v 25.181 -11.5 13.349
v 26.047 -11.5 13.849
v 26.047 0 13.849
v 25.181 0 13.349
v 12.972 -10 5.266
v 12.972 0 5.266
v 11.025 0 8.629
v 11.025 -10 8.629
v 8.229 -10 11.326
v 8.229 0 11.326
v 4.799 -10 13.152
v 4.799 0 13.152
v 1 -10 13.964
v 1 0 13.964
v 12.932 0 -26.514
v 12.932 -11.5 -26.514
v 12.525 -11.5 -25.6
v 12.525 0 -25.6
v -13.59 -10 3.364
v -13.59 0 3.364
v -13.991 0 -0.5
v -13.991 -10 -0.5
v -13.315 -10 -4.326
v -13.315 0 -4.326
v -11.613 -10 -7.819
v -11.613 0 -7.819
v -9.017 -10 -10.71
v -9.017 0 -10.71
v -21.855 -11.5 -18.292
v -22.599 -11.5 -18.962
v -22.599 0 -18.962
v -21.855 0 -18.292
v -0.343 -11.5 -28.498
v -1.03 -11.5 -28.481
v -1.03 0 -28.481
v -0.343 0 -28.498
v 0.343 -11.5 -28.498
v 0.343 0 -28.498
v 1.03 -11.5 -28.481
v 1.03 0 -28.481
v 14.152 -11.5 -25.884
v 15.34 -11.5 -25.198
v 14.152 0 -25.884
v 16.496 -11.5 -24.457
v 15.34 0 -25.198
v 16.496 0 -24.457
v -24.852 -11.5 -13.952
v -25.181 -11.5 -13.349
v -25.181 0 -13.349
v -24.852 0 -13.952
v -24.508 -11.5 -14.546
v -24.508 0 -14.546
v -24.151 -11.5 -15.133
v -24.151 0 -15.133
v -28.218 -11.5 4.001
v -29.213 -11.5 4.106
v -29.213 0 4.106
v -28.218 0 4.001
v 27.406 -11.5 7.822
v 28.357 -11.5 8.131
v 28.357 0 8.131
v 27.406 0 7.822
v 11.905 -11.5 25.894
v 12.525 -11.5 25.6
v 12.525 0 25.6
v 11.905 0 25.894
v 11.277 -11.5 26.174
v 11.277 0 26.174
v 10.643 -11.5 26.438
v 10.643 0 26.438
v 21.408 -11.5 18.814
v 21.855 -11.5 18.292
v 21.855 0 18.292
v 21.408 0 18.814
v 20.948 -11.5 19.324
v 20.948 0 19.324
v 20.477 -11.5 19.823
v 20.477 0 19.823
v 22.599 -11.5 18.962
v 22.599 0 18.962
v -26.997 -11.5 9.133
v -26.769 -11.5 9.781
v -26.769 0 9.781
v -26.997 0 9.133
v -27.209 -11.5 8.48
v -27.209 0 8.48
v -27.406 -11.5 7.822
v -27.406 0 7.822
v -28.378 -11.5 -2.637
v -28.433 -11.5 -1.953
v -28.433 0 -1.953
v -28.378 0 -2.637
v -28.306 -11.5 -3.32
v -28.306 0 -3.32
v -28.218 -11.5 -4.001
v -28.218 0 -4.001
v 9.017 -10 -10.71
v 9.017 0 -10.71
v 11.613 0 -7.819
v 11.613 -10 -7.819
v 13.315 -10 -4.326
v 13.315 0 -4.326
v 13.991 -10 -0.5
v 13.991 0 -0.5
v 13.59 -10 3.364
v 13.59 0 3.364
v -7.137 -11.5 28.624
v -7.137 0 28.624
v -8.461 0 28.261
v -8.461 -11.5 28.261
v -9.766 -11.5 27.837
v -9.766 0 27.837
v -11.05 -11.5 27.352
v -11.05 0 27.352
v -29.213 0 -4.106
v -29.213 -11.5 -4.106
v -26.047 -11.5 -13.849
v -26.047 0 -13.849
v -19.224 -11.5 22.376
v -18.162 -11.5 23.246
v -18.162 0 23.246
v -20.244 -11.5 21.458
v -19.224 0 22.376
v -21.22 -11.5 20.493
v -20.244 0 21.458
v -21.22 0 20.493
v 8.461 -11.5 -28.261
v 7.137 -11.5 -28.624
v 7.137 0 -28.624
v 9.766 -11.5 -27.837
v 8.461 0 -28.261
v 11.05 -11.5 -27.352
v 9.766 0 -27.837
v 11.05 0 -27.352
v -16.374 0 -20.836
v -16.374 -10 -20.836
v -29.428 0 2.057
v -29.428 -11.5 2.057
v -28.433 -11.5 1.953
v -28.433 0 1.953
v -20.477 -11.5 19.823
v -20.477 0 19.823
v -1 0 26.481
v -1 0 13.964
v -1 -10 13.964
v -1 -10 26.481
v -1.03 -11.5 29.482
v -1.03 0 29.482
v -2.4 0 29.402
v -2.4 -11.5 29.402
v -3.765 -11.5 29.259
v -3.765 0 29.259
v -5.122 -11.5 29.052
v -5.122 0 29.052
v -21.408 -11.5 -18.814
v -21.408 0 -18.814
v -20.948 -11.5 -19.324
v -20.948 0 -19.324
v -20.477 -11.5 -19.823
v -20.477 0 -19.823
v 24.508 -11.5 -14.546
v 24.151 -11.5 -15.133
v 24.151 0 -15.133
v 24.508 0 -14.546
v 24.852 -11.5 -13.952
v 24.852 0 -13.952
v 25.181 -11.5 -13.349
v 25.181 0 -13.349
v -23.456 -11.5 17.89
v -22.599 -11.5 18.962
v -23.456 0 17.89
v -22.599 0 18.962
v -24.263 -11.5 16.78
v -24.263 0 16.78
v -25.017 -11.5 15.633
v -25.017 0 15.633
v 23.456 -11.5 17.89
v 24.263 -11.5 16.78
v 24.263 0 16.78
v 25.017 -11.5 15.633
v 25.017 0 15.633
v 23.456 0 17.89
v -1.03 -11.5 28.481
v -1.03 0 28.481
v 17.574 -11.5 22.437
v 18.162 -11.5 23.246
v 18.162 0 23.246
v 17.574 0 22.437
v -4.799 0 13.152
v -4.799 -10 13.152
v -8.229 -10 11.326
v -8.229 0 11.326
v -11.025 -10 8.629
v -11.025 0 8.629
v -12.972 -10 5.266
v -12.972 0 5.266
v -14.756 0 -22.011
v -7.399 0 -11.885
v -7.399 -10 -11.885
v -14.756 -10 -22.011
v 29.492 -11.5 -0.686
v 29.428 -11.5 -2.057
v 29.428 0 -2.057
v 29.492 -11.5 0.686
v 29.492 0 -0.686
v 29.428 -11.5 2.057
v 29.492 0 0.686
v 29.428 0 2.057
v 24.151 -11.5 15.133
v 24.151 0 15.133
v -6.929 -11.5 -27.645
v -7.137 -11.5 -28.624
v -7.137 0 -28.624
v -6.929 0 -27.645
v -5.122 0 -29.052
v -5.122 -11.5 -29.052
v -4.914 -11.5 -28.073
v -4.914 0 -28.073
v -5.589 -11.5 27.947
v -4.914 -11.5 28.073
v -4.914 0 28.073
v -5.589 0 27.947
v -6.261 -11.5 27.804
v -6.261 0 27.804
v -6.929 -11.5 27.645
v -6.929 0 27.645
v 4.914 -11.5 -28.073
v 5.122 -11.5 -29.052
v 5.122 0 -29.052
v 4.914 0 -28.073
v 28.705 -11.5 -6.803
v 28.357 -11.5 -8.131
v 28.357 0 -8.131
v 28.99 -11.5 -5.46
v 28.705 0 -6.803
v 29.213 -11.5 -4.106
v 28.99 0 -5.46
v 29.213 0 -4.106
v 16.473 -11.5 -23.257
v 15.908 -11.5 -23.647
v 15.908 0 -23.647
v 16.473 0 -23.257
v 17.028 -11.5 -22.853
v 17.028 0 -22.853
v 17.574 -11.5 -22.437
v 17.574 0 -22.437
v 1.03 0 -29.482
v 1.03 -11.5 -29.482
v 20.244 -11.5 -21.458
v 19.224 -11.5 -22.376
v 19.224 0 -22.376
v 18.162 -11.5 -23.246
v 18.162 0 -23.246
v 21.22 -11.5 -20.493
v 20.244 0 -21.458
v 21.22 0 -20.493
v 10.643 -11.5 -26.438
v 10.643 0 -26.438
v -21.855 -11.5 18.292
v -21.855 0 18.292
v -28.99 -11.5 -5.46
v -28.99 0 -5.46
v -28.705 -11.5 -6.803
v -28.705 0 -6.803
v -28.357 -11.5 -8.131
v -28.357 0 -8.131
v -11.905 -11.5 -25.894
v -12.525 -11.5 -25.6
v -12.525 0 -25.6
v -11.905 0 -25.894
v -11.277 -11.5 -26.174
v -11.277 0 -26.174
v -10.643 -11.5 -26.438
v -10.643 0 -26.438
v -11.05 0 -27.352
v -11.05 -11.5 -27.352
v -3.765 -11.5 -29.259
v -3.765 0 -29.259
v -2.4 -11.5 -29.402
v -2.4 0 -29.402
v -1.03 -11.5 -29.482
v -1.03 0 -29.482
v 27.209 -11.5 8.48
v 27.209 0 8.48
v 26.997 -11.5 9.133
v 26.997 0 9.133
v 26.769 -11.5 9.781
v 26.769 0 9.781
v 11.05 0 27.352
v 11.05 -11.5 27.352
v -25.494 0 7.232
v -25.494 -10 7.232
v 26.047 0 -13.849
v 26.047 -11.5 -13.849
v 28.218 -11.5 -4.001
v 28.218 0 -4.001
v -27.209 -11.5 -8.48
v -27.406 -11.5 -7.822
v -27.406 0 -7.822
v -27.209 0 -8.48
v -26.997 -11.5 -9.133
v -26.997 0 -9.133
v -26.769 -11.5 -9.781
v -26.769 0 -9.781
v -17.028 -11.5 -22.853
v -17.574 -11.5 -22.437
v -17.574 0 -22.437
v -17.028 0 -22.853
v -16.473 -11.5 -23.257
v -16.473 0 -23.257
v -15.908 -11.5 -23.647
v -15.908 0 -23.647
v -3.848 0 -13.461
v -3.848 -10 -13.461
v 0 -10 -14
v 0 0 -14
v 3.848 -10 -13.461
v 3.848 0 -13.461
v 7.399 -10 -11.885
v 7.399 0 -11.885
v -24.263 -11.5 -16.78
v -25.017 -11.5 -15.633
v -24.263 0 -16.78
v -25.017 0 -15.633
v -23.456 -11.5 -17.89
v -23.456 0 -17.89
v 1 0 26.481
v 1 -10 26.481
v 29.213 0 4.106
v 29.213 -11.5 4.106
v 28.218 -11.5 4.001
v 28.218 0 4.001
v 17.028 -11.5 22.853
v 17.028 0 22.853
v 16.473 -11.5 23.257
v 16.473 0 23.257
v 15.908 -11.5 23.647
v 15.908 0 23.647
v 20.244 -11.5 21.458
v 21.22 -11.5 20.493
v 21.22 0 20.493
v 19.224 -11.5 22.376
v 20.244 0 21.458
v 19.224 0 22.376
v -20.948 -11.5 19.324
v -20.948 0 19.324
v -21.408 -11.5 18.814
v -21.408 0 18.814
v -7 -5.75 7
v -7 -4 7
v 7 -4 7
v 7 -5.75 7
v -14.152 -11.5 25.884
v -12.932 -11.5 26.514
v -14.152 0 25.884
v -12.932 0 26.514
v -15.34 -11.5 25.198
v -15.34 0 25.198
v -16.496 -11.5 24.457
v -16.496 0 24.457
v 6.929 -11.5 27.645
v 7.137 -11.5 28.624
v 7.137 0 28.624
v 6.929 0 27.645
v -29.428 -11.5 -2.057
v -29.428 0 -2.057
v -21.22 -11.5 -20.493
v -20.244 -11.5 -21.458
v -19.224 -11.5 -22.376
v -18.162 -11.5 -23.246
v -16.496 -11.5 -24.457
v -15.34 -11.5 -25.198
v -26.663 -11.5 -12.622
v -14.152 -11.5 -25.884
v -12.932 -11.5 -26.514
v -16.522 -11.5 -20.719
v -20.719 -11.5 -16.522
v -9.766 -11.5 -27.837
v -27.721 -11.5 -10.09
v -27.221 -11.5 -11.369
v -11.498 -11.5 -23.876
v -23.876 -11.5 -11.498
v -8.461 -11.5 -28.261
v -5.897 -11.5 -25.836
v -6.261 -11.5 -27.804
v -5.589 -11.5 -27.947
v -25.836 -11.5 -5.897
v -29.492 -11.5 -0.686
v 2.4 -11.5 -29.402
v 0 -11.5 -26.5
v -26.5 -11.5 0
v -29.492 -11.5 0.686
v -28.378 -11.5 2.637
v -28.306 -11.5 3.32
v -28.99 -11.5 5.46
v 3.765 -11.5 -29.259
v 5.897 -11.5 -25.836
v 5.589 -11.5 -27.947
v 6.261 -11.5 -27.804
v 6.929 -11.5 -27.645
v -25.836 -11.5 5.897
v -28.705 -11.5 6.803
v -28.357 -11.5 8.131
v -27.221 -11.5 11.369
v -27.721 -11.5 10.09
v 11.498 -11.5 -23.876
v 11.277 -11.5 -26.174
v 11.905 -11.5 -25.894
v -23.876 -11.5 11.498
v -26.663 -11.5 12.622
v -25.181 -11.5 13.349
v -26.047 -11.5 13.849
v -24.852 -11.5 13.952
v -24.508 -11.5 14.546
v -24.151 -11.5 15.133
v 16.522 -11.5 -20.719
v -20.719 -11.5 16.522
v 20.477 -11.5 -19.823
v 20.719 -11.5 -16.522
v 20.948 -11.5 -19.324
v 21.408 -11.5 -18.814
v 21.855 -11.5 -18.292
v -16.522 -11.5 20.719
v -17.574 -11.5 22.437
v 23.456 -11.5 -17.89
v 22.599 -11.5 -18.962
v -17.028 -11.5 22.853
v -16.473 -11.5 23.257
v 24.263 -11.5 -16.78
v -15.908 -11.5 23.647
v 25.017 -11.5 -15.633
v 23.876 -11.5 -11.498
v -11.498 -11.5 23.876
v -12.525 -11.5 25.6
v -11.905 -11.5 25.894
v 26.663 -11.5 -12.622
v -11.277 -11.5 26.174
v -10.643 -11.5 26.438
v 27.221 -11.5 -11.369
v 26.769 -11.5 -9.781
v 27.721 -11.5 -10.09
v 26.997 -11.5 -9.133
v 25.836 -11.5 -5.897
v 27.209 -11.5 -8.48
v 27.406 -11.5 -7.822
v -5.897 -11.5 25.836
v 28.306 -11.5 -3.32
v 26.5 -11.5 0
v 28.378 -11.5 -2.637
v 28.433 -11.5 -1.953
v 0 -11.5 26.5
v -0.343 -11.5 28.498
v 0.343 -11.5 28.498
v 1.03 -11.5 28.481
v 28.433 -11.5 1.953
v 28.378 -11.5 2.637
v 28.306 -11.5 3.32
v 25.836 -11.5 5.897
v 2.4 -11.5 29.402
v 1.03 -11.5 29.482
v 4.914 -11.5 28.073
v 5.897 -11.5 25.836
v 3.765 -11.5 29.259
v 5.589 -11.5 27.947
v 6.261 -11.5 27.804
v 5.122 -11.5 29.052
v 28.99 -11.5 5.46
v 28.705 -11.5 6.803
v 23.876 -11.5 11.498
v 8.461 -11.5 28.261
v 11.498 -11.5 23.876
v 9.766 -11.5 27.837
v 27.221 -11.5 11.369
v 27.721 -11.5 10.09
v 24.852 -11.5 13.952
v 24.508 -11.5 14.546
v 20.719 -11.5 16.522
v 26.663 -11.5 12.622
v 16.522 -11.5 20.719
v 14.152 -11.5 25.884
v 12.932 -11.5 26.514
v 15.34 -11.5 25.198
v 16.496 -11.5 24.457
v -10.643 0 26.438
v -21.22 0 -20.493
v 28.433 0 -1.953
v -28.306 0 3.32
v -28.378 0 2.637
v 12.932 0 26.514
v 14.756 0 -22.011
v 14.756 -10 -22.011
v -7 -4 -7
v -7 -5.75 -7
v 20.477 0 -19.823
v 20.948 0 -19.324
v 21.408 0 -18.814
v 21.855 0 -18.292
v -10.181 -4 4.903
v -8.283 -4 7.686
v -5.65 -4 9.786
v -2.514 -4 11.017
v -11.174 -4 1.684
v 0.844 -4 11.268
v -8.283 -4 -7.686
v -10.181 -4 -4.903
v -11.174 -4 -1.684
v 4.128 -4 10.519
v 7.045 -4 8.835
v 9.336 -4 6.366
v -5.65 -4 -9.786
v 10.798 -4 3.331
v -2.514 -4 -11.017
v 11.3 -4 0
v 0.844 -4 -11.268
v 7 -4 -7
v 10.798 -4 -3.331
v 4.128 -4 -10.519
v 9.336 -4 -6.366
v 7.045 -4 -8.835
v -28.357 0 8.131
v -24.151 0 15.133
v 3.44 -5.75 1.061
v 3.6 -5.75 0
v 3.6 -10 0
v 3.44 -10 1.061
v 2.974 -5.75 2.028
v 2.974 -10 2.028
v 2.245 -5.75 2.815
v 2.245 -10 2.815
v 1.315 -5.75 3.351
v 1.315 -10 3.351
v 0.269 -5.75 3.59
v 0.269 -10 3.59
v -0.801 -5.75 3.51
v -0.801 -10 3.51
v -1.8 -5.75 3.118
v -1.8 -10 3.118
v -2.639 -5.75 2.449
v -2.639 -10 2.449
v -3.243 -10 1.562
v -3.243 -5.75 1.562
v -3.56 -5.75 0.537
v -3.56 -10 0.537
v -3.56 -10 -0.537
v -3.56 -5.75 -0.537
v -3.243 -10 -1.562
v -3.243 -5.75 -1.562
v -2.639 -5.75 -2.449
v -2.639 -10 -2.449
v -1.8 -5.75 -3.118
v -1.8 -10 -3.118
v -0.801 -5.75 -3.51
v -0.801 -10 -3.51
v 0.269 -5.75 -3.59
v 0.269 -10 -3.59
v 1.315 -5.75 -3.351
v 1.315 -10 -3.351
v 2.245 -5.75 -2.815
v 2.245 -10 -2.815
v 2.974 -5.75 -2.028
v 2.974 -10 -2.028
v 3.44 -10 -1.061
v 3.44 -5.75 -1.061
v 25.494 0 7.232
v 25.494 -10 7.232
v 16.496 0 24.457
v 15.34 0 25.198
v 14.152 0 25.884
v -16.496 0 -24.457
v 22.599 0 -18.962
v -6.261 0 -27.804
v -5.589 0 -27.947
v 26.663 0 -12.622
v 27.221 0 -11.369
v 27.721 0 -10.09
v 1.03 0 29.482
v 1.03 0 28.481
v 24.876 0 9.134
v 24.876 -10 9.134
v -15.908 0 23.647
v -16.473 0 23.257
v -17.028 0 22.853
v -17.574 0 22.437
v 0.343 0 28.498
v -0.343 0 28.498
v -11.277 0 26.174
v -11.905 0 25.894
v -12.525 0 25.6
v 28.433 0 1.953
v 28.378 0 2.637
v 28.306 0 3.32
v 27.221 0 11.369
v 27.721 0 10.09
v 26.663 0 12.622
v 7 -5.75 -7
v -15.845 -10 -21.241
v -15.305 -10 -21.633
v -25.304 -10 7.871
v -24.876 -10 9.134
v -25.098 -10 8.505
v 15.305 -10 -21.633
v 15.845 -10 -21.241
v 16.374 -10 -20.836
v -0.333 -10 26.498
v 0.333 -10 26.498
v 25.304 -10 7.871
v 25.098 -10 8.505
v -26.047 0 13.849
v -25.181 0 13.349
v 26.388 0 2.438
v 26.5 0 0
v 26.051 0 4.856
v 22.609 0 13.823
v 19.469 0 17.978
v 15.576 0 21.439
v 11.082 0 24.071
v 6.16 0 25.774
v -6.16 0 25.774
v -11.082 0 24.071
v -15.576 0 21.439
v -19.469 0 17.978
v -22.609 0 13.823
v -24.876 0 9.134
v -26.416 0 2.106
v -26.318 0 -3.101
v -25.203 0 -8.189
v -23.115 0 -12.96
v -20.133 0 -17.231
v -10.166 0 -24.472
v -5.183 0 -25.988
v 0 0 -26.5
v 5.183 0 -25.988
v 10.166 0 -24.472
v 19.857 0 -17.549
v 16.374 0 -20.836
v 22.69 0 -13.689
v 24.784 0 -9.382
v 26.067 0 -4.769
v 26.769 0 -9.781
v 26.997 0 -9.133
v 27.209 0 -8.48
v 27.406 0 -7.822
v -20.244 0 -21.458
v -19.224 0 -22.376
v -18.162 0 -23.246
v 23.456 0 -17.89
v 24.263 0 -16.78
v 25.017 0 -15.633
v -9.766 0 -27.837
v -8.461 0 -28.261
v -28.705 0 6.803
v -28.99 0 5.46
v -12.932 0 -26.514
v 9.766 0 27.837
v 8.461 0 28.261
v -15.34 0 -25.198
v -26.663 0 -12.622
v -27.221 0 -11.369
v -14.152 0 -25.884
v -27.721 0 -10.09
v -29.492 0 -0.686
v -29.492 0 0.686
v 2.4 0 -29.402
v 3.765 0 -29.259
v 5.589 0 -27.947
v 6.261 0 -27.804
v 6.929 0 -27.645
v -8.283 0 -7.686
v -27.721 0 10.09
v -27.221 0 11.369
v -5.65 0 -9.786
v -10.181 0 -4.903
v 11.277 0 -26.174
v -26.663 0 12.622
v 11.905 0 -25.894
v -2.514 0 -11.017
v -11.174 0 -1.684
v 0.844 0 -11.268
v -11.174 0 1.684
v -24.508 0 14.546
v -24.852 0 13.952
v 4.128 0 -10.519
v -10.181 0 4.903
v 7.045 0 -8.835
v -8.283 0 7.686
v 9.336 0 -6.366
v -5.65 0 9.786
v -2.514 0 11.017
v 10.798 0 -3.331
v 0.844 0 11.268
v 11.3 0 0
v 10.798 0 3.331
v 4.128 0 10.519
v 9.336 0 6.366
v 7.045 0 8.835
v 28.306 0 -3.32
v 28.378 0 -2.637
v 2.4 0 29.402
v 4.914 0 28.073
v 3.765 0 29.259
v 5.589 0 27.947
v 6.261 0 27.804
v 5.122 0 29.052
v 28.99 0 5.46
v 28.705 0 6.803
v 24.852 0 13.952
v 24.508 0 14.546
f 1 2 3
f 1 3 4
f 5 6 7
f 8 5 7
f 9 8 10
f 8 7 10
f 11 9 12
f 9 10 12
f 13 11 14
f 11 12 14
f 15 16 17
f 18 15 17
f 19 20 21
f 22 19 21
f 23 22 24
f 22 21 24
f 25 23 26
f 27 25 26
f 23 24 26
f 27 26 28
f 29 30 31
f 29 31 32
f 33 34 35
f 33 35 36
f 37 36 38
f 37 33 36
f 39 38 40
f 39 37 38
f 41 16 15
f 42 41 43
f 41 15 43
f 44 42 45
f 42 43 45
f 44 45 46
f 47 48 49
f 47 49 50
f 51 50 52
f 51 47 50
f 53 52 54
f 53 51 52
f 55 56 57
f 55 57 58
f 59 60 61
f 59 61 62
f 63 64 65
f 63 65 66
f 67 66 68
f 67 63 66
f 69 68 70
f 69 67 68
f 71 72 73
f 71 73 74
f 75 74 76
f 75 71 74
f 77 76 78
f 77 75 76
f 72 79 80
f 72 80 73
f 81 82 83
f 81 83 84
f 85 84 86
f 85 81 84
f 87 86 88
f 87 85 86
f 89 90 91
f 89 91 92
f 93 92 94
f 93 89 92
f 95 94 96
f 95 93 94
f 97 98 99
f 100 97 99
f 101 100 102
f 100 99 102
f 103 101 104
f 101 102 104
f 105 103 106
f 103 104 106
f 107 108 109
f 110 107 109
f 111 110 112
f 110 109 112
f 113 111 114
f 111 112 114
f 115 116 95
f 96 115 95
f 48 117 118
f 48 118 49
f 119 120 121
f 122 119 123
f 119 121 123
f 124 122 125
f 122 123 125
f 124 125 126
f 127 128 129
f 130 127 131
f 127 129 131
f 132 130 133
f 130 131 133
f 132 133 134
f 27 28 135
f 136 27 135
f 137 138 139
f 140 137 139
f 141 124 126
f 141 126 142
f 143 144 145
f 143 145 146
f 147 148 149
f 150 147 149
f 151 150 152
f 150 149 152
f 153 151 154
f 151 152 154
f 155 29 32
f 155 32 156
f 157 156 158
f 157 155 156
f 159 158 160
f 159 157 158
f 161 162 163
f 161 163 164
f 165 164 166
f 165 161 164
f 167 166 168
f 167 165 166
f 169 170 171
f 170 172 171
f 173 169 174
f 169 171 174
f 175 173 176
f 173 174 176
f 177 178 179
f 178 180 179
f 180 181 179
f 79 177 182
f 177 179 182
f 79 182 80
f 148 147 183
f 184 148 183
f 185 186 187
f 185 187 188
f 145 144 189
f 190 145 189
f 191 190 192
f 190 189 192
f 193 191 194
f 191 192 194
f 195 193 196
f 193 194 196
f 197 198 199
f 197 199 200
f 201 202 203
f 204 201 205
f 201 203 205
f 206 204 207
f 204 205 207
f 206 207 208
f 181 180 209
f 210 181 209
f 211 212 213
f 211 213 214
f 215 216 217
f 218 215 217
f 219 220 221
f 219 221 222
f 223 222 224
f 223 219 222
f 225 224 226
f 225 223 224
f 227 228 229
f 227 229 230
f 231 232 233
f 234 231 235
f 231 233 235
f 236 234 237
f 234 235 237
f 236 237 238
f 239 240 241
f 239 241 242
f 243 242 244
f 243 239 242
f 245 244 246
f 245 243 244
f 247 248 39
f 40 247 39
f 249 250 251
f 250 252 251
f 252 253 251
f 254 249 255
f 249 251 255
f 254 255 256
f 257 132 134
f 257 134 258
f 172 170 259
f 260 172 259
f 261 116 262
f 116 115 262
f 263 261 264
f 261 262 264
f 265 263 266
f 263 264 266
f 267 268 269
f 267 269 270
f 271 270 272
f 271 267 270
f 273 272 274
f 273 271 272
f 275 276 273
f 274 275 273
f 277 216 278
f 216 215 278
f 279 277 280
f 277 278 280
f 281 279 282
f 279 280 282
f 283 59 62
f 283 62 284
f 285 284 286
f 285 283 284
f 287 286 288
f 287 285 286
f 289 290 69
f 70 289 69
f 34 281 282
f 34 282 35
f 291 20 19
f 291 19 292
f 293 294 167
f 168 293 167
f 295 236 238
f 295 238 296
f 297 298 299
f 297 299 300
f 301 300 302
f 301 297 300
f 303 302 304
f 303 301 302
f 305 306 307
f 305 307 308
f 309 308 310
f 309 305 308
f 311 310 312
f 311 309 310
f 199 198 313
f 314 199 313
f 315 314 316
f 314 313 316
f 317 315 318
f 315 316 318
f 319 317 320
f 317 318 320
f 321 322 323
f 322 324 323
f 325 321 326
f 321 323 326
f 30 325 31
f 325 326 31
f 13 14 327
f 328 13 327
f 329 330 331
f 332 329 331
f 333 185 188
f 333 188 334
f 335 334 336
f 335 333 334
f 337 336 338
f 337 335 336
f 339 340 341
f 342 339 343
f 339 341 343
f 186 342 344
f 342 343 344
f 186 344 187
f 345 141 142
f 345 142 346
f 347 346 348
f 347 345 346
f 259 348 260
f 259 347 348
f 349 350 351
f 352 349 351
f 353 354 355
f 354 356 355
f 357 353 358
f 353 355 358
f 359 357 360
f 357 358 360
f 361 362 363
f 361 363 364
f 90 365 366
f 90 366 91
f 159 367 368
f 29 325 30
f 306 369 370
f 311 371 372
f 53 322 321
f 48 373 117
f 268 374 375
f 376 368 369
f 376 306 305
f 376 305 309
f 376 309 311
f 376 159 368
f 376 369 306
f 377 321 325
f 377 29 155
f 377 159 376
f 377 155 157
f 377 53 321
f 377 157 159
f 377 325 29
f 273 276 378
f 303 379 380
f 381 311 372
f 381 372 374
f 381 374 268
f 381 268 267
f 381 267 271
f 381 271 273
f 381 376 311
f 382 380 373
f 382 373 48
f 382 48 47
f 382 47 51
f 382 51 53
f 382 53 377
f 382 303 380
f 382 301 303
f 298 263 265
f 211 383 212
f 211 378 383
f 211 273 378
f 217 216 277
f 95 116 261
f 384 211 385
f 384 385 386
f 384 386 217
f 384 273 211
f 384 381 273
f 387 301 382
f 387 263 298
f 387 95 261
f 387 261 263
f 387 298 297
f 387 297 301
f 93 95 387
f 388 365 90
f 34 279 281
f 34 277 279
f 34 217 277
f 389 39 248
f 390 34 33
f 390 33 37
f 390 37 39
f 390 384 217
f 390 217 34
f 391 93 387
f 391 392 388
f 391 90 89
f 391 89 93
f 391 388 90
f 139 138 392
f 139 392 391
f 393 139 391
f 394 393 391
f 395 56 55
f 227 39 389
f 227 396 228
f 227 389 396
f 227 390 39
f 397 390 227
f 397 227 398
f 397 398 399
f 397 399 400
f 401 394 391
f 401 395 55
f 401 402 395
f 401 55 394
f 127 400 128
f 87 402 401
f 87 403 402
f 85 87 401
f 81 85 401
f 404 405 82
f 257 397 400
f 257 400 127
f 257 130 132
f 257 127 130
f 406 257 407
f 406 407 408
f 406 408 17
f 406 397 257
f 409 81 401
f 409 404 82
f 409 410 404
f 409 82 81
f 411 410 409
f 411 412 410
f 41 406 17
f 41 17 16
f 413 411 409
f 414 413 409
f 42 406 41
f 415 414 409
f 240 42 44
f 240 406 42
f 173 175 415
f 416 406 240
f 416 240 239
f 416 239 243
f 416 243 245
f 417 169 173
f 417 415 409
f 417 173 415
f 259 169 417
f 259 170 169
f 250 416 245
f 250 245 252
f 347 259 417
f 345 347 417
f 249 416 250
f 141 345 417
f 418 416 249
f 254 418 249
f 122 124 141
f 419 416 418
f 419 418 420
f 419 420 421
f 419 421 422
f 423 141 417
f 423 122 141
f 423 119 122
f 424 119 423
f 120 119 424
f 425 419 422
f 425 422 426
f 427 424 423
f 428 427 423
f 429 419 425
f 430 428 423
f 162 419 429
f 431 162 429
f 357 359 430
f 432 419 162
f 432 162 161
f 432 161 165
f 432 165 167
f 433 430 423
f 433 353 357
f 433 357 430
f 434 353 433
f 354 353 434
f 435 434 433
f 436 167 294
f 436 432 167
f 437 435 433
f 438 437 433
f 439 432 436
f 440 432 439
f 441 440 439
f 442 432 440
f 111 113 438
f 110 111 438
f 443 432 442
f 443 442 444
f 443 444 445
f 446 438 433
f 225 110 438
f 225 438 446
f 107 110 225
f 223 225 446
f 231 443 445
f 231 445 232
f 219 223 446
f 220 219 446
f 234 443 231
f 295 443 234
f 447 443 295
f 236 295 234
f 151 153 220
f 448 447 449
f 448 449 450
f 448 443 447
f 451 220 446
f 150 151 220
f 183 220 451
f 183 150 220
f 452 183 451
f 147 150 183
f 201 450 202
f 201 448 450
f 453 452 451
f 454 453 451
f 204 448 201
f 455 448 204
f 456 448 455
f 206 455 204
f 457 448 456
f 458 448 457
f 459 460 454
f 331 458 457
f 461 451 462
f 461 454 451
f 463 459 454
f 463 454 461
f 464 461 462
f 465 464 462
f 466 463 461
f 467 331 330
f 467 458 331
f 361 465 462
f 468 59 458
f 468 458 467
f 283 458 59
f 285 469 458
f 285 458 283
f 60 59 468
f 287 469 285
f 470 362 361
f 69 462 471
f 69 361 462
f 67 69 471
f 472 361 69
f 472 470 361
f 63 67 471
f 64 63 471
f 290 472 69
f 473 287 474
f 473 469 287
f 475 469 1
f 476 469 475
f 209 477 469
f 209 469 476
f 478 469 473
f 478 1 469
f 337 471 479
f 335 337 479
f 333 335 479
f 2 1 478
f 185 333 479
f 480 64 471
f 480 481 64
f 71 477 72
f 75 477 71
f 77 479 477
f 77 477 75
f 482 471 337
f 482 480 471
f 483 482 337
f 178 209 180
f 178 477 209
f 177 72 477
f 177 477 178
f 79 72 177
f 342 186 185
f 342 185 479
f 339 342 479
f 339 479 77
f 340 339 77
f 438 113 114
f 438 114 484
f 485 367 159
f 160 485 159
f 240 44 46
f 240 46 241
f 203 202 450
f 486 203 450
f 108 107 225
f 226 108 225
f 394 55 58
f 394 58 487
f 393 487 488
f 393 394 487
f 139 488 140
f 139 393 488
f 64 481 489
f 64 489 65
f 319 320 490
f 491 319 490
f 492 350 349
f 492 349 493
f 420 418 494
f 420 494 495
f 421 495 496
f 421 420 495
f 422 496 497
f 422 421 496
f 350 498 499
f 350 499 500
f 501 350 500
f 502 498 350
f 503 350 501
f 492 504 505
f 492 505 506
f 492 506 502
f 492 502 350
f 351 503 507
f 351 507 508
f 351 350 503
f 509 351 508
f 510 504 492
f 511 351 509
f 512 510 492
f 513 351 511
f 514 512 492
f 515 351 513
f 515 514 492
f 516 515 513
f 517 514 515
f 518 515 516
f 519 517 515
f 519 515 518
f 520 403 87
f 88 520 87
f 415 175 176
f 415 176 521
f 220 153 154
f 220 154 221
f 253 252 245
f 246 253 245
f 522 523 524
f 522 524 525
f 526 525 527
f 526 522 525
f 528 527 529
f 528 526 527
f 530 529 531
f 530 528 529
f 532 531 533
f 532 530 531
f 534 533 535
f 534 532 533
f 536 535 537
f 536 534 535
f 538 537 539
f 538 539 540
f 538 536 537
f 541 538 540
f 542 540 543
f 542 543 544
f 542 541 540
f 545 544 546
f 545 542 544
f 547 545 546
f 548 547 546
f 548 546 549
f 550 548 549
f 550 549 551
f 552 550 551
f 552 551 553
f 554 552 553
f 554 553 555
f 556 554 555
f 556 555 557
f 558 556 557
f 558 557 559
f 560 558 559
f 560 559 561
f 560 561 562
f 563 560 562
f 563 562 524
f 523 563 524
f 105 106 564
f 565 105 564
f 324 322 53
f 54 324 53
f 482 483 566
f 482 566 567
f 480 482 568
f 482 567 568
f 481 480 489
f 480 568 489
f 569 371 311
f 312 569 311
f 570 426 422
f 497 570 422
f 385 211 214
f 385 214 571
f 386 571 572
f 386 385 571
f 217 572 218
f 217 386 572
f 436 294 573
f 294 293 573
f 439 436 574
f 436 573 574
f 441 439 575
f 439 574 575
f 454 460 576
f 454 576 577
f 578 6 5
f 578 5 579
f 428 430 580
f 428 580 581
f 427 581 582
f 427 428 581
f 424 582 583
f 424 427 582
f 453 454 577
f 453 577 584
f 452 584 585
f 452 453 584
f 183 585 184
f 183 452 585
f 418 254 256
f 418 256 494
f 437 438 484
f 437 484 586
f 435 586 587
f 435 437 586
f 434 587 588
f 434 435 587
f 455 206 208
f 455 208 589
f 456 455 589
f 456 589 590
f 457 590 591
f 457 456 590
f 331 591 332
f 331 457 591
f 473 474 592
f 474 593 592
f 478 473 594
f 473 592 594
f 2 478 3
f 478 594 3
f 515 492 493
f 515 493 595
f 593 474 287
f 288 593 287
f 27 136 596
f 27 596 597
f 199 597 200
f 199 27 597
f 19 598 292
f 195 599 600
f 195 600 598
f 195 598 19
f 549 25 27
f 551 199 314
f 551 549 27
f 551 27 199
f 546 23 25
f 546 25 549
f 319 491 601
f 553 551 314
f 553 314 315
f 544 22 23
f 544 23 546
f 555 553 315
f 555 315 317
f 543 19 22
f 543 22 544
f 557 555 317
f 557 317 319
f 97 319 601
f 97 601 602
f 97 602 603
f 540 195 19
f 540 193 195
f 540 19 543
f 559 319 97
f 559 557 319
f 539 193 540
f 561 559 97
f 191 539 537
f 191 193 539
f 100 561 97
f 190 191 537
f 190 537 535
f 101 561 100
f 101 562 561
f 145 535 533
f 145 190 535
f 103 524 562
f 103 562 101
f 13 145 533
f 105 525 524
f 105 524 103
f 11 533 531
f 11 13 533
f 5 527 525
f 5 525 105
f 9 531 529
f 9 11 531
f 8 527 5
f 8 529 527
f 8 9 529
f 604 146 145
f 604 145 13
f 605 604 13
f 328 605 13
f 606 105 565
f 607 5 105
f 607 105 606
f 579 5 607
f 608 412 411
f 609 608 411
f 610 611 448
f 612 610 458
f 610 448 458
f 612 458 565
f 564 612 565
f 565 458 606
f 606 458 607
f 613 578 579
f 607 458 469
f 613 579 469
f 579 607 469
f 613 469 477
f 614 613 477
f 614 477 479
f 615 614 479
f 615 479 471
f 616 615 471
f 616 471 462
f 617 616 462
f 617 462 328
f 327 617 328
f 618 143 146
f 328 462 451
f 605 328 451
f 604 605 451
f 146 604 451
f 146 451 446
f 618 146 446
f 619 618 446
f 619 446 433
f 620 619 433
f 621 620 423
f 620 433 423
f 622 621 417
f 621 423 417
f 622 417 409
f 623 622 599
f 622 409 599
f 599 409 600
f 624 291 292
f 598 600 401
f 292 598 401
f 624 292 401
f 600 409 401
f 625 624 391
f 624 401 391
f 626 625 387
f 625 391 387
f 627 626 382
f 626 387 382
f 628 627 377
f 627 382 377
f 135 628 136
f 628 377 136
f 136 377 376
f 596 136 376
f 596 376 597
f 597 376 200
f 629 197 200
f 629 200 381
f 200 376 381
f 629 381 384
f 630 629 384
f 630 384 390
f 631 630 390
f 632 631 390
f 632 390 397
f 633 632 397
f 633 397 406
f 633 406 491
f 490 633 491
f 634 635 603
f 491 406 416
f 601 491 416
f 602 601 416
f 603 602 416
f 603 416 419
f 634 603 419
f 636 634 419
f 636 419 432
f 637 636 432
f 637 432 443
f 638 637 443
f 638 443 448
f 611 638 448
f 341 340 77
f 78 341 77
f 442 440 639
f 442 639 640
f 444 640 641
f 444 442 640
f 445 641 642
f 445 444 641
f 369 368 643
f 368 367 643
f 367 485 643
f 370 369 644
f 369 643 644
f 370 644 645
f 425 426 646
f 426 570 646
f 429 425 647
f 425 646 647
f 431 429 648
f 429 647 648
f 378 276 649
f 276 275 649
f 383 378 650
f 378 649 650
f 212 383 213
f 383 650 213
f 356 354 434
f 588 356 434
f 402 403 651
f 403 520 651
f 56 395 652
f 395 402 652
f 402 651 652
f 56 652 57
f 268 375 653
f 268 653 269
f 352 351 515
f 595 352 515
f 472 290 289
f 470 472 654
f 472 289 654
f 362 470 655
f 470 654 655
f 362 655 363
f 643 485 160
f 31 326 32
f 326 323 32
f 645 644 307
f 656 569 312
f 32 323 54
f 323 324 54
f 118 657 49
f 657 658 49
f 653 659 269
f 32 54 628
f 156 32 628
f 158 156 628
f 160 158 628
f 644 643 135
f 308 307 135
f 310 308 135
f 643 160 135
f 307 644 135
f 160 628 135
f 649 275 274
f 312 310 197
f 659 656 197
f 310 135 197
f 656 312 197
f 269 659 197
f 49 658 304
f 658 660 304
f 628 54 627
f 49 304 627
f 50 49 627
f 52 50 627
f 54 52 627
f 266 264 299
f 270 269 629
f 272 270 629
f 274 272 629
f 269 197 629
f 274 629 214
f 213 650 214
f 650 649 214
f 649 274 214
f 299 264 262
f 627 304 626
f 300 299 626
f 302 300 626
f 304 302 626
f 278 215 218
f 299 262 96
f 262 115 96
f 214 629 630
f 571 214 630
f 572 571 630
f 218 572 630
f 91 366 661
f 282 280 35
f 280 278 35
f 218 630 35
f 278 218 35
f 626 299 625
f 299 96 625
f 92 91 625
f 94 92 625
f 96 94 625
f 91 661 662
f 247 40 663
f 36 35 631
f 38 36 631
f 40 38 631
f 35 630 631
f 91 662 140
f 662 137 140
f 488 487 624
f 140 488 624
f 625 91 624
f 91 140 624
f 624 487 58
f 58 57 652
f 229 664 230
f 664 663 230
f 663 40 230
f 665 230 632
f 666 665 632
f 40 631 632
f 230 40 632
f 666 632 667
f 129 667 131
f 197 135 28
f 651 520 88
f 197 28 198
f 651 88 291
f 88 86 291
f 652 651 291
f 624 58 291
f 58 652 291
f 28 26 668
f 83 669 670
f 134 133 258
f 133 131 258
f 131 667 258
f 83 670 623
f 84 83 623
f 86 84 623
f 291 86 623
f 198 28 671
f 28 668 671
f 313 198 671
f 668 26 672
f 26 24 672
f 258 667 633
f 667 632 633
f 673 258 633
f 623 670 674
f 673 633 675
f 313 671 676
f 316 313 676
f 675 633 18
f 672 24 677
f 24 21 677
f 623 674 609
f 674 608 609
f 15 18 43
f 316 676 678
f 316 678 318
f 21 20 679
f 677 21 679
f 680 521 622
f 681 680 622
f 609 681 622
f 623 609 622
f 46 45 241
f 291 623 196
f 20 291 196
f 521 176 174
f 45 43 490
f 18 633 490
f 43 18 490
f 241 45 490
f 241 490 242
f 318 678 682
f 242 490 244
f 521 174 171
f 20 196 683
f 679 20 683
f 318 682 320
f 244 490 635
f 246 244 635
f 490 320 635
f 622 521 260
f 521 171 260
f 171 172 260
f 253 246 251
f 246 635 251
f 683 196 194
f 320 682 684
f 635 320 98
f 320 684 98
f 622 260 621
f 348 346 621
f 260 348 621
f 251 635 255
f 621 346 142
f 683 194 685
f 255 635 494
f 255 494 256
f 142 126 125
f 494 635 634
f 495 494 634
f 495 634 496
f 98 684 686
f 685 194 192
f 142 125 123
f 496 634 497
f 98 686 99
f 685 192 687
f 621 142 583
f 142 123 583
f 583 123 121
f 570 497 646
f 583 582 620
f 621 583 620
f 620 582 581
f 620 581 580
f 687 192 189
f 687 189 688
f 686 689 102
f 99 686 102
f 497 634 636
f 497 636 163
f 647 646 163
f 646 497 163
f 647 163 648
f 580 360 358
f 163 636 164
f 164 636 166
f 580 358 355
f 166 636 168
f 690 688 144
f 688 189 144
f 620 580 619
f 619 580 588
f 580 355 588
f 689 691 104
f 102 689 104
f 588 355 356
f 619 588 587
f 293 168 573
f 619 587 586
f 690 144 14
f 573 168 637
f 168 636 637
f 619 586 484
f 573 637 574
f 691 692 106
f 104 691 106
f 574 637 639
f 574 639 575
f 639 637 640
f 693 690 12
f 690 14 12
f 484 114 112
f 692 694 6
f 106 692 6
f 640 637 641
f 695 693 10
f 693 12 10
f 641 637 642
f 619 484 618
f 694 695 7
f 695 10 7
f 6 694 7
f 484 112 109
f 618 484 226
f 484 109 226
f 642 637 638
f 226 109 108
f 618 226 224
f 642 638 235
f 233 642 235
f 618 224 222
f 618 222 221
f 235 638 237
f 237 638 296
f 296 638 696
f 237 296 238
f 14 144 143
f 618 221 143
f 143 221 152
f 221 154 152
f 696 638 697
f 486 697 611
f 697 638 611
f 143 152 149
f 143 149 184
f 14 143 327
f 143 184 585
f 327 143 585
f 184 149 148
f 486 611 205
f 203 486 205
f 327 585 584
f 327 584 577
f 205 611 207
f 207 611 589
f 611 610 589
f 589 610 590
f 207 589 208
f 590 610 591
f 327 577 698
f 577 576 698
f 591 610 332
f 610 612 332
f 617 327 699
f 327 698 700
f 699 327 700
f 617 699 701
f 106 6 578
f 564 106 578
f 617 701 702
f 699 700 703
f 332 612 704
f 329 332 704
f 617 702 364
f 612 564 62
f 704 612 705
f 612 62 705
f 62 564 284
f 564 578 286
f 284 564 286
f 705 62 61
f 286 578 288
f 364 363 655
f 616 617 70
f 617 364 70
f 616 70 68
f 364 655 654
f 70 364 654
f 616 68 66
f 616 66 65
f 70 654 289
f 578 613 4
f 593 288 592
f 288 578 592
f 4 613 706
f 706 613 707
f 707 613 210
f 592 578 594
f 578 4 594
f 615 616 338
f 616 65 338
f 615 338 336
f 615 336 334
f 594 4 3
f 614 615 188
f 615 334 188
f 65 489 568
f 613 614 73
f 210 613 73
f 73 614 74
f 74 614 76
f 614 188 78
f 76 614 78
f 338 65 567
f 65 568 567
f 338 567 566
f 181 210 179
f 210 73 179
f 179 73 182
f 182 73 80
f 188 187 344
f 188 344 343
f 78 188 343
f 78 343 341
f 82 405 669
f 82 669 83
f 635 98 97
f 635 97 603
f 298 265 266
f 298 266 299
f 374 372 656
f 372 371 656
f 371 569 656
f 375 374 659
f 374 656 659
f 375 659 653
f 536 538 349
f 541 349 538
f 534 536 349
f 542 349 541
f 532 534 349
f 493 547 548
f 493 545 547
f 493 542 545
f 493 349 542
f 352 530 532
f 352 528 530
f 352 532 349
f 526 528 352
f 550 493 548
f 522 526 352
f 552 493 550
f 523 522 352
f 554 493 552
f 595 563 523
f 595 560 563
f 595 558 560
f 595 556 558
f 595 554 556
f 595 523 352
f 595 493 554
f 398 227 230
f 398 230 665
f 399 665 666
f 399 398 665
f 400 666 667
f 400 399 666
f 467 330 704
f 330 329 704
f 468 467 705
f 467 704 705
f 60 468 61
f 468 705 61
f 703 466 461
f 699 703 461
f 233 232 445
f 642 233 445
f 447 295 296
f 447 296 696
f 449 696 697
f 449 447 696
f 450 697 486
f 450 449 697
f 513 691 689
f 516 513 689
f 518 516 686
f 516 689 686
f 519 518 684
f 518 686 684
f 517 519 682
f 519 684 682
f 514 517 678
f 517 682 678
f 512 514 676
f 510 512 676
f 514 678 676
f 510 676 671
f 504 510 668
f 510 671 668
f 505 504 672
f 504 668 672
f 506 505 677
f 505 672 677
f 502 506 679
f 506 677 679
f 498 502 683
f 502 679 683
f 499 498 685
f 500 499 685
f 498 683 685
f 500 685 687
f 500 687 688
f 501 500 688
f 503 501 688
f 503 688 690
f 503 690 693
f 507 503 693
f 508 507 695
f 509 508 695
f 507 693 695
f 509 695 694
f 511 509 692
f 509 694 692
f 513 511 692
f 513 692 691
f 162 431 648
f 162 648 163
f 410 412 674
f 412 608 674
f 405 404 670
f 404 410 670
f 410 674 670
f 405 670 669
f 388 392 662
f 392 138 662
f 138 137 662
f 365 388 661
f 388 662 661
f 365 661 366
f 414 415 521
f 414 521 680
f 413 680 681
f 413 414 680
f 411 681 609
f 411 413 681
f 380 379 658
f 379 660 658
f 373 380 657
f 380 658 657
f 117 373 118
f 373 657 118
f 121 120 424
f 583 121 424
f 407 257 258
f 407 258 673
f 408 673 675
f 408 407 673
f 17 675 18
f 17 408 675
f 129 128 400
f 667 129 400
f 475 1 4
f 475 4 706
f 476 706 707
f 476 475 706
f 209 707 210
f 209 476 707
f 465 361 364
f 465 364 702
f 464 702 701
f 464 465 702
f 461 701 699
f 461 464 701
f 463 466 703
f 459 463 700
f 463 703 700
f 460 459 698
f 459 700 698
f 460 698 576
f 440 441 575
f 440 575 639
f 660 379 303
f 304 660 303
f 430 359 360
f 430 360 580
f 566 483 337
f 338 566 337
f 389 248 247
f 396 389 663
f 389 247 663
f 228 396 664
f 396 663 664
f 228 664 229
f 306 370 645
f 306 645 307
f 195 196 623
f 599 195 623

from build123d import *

# Parameters (mm, degrees)
SKETCH_R              = 29.5
PAD_DEPTH             = 11.5
SKETCH001_R           = 26.5
POCKET_DEPTH          = 11.501
PAD001_DEPTH          = 10
POLARPATTERN_COUNT    = 5
SKETCH003_R           = 14
SKETCH003_R_2         = 3.6
PAD002_DEPTH          = 10
SKETCH004_W           = 14
SKETCH004_H           = 14
POCKET001_DEPTH       = 5.75
SKETCH005_R           = 11.3
POCKET002_DEPTH       = 4
POCKET003_DEPTH       = 179.9557416964
POLARPATTERN001_COUNT = 30


with BuildPart() as part:
    # Sketch → Pad (new body)
    with BuildSketch(Plane.XZ):
        Circle(SKETCH_R)
    extrude(amount=PAD_DEPTH)

    # Sketch001 (on Face3 of Pad) → Pocket (cut, through all)
    with BuildSketch(Plane.XZ.offset(11.5)):
        Circle(SKETCH001_R)
    extrude(amount=-POCKET_DEPTH, mode=Mode.SUBTRACT)

    # Sketch002 → Pad001 (join)
    with BuildSketch(Plane.XZ):
        with BuildLine():
            ThreePointArc((1, 13.9642400438), (0, 14), (-1, 13.9642400438))
            Line((-1, 13.9642400438), (-1, 26.4811253537))
            ThreePointArc((1, 26.4811253537), (0, 26.5), (-1, 26.4811253537))
            Line((1, 13.9642400438), (1, 26.4811253537))
        make_face()
    pad001 = extrude(amount=PAD001_DEPTH)

    # PolarPattern: Pad001 ×5 about axis
    polarpattern_axis = Axis((0, 0, 0), (0, -1, 0))
    for i in range(1, POLARPATTERN_COUNT):
        add(pad001.rotate(polarpattern_axis, i * 360 / POLARPATTERN_COUNT))

    # Sketch003 → Pad002 (join)
    with BuildSketch(Plane.XZ):
        Circle(SKETCH003_R)
        Circle(SKETCH003_R_2, mode=Mode.SUBTRACT)
    extrude(amount=PAD002_DEPTH)

    # Sketch004 (on Face2 of Pad002) → Pocket001 (cut)
    with BuildSketch(Plane(origin=(0, 0, 0), x_dir=(1, 0, 0), z_dir=(0, 1, 0))):
        Rectangle(SKETCH004_W, SKETCH004_H)
    extrude(amount=-POCKET001_DEPTH, mode=Mode.SUBTRACT)

    # Sketch005 (on Face2 of Pocket001) → Pocket002 (cut)
    with BuildSketch(Plane(origin=(0, 0, 0), x_dir=(1, 0, 0), z_dir=(0, 1, 0))):
        Circle(SKETCH005_R)
    extrude(amount=-POCKET002_DEPTH, mode=Mode.SUBTRACT)

    # Sketch006 (on Face34 of Pocket002) → Pocket003 (cut, through all)
    with BuildSketch(Plane.XZ.offset(11.5)):
        with BuildLine():
            Line((-1.03, 29.4820131606), (-1.03, 28.4813816379))
            ThreePointArc((1.03, 28.4813816378), (0, 28.5), (-1.03, 28.4813816378))
            Line((1.03, 29.4820131606), (1.03, 28.4813816378))
            ThreePointArc((1.03, 29.4820131606), (0, 29.5), (-1.03, 29.4820131606))
        make_face()
    pocket003 = extrude(amount=-POCKET003_DEPTH, mode=Mode.SUBTRACT)

    # PolarPattern001: Pocket003 ×30 about axis
    polarpattern001_axis = Axis((0, -11.5, 0), (0, -1, 0))
    for i in range(1, POLARPATTERN001_COUNT):
        add(pocket003.rotate(polarpattern001_axis, i * 360 / POLARPATTERN001_COUNT), mode=Mode.SUBTRACT)


solid = part.part
